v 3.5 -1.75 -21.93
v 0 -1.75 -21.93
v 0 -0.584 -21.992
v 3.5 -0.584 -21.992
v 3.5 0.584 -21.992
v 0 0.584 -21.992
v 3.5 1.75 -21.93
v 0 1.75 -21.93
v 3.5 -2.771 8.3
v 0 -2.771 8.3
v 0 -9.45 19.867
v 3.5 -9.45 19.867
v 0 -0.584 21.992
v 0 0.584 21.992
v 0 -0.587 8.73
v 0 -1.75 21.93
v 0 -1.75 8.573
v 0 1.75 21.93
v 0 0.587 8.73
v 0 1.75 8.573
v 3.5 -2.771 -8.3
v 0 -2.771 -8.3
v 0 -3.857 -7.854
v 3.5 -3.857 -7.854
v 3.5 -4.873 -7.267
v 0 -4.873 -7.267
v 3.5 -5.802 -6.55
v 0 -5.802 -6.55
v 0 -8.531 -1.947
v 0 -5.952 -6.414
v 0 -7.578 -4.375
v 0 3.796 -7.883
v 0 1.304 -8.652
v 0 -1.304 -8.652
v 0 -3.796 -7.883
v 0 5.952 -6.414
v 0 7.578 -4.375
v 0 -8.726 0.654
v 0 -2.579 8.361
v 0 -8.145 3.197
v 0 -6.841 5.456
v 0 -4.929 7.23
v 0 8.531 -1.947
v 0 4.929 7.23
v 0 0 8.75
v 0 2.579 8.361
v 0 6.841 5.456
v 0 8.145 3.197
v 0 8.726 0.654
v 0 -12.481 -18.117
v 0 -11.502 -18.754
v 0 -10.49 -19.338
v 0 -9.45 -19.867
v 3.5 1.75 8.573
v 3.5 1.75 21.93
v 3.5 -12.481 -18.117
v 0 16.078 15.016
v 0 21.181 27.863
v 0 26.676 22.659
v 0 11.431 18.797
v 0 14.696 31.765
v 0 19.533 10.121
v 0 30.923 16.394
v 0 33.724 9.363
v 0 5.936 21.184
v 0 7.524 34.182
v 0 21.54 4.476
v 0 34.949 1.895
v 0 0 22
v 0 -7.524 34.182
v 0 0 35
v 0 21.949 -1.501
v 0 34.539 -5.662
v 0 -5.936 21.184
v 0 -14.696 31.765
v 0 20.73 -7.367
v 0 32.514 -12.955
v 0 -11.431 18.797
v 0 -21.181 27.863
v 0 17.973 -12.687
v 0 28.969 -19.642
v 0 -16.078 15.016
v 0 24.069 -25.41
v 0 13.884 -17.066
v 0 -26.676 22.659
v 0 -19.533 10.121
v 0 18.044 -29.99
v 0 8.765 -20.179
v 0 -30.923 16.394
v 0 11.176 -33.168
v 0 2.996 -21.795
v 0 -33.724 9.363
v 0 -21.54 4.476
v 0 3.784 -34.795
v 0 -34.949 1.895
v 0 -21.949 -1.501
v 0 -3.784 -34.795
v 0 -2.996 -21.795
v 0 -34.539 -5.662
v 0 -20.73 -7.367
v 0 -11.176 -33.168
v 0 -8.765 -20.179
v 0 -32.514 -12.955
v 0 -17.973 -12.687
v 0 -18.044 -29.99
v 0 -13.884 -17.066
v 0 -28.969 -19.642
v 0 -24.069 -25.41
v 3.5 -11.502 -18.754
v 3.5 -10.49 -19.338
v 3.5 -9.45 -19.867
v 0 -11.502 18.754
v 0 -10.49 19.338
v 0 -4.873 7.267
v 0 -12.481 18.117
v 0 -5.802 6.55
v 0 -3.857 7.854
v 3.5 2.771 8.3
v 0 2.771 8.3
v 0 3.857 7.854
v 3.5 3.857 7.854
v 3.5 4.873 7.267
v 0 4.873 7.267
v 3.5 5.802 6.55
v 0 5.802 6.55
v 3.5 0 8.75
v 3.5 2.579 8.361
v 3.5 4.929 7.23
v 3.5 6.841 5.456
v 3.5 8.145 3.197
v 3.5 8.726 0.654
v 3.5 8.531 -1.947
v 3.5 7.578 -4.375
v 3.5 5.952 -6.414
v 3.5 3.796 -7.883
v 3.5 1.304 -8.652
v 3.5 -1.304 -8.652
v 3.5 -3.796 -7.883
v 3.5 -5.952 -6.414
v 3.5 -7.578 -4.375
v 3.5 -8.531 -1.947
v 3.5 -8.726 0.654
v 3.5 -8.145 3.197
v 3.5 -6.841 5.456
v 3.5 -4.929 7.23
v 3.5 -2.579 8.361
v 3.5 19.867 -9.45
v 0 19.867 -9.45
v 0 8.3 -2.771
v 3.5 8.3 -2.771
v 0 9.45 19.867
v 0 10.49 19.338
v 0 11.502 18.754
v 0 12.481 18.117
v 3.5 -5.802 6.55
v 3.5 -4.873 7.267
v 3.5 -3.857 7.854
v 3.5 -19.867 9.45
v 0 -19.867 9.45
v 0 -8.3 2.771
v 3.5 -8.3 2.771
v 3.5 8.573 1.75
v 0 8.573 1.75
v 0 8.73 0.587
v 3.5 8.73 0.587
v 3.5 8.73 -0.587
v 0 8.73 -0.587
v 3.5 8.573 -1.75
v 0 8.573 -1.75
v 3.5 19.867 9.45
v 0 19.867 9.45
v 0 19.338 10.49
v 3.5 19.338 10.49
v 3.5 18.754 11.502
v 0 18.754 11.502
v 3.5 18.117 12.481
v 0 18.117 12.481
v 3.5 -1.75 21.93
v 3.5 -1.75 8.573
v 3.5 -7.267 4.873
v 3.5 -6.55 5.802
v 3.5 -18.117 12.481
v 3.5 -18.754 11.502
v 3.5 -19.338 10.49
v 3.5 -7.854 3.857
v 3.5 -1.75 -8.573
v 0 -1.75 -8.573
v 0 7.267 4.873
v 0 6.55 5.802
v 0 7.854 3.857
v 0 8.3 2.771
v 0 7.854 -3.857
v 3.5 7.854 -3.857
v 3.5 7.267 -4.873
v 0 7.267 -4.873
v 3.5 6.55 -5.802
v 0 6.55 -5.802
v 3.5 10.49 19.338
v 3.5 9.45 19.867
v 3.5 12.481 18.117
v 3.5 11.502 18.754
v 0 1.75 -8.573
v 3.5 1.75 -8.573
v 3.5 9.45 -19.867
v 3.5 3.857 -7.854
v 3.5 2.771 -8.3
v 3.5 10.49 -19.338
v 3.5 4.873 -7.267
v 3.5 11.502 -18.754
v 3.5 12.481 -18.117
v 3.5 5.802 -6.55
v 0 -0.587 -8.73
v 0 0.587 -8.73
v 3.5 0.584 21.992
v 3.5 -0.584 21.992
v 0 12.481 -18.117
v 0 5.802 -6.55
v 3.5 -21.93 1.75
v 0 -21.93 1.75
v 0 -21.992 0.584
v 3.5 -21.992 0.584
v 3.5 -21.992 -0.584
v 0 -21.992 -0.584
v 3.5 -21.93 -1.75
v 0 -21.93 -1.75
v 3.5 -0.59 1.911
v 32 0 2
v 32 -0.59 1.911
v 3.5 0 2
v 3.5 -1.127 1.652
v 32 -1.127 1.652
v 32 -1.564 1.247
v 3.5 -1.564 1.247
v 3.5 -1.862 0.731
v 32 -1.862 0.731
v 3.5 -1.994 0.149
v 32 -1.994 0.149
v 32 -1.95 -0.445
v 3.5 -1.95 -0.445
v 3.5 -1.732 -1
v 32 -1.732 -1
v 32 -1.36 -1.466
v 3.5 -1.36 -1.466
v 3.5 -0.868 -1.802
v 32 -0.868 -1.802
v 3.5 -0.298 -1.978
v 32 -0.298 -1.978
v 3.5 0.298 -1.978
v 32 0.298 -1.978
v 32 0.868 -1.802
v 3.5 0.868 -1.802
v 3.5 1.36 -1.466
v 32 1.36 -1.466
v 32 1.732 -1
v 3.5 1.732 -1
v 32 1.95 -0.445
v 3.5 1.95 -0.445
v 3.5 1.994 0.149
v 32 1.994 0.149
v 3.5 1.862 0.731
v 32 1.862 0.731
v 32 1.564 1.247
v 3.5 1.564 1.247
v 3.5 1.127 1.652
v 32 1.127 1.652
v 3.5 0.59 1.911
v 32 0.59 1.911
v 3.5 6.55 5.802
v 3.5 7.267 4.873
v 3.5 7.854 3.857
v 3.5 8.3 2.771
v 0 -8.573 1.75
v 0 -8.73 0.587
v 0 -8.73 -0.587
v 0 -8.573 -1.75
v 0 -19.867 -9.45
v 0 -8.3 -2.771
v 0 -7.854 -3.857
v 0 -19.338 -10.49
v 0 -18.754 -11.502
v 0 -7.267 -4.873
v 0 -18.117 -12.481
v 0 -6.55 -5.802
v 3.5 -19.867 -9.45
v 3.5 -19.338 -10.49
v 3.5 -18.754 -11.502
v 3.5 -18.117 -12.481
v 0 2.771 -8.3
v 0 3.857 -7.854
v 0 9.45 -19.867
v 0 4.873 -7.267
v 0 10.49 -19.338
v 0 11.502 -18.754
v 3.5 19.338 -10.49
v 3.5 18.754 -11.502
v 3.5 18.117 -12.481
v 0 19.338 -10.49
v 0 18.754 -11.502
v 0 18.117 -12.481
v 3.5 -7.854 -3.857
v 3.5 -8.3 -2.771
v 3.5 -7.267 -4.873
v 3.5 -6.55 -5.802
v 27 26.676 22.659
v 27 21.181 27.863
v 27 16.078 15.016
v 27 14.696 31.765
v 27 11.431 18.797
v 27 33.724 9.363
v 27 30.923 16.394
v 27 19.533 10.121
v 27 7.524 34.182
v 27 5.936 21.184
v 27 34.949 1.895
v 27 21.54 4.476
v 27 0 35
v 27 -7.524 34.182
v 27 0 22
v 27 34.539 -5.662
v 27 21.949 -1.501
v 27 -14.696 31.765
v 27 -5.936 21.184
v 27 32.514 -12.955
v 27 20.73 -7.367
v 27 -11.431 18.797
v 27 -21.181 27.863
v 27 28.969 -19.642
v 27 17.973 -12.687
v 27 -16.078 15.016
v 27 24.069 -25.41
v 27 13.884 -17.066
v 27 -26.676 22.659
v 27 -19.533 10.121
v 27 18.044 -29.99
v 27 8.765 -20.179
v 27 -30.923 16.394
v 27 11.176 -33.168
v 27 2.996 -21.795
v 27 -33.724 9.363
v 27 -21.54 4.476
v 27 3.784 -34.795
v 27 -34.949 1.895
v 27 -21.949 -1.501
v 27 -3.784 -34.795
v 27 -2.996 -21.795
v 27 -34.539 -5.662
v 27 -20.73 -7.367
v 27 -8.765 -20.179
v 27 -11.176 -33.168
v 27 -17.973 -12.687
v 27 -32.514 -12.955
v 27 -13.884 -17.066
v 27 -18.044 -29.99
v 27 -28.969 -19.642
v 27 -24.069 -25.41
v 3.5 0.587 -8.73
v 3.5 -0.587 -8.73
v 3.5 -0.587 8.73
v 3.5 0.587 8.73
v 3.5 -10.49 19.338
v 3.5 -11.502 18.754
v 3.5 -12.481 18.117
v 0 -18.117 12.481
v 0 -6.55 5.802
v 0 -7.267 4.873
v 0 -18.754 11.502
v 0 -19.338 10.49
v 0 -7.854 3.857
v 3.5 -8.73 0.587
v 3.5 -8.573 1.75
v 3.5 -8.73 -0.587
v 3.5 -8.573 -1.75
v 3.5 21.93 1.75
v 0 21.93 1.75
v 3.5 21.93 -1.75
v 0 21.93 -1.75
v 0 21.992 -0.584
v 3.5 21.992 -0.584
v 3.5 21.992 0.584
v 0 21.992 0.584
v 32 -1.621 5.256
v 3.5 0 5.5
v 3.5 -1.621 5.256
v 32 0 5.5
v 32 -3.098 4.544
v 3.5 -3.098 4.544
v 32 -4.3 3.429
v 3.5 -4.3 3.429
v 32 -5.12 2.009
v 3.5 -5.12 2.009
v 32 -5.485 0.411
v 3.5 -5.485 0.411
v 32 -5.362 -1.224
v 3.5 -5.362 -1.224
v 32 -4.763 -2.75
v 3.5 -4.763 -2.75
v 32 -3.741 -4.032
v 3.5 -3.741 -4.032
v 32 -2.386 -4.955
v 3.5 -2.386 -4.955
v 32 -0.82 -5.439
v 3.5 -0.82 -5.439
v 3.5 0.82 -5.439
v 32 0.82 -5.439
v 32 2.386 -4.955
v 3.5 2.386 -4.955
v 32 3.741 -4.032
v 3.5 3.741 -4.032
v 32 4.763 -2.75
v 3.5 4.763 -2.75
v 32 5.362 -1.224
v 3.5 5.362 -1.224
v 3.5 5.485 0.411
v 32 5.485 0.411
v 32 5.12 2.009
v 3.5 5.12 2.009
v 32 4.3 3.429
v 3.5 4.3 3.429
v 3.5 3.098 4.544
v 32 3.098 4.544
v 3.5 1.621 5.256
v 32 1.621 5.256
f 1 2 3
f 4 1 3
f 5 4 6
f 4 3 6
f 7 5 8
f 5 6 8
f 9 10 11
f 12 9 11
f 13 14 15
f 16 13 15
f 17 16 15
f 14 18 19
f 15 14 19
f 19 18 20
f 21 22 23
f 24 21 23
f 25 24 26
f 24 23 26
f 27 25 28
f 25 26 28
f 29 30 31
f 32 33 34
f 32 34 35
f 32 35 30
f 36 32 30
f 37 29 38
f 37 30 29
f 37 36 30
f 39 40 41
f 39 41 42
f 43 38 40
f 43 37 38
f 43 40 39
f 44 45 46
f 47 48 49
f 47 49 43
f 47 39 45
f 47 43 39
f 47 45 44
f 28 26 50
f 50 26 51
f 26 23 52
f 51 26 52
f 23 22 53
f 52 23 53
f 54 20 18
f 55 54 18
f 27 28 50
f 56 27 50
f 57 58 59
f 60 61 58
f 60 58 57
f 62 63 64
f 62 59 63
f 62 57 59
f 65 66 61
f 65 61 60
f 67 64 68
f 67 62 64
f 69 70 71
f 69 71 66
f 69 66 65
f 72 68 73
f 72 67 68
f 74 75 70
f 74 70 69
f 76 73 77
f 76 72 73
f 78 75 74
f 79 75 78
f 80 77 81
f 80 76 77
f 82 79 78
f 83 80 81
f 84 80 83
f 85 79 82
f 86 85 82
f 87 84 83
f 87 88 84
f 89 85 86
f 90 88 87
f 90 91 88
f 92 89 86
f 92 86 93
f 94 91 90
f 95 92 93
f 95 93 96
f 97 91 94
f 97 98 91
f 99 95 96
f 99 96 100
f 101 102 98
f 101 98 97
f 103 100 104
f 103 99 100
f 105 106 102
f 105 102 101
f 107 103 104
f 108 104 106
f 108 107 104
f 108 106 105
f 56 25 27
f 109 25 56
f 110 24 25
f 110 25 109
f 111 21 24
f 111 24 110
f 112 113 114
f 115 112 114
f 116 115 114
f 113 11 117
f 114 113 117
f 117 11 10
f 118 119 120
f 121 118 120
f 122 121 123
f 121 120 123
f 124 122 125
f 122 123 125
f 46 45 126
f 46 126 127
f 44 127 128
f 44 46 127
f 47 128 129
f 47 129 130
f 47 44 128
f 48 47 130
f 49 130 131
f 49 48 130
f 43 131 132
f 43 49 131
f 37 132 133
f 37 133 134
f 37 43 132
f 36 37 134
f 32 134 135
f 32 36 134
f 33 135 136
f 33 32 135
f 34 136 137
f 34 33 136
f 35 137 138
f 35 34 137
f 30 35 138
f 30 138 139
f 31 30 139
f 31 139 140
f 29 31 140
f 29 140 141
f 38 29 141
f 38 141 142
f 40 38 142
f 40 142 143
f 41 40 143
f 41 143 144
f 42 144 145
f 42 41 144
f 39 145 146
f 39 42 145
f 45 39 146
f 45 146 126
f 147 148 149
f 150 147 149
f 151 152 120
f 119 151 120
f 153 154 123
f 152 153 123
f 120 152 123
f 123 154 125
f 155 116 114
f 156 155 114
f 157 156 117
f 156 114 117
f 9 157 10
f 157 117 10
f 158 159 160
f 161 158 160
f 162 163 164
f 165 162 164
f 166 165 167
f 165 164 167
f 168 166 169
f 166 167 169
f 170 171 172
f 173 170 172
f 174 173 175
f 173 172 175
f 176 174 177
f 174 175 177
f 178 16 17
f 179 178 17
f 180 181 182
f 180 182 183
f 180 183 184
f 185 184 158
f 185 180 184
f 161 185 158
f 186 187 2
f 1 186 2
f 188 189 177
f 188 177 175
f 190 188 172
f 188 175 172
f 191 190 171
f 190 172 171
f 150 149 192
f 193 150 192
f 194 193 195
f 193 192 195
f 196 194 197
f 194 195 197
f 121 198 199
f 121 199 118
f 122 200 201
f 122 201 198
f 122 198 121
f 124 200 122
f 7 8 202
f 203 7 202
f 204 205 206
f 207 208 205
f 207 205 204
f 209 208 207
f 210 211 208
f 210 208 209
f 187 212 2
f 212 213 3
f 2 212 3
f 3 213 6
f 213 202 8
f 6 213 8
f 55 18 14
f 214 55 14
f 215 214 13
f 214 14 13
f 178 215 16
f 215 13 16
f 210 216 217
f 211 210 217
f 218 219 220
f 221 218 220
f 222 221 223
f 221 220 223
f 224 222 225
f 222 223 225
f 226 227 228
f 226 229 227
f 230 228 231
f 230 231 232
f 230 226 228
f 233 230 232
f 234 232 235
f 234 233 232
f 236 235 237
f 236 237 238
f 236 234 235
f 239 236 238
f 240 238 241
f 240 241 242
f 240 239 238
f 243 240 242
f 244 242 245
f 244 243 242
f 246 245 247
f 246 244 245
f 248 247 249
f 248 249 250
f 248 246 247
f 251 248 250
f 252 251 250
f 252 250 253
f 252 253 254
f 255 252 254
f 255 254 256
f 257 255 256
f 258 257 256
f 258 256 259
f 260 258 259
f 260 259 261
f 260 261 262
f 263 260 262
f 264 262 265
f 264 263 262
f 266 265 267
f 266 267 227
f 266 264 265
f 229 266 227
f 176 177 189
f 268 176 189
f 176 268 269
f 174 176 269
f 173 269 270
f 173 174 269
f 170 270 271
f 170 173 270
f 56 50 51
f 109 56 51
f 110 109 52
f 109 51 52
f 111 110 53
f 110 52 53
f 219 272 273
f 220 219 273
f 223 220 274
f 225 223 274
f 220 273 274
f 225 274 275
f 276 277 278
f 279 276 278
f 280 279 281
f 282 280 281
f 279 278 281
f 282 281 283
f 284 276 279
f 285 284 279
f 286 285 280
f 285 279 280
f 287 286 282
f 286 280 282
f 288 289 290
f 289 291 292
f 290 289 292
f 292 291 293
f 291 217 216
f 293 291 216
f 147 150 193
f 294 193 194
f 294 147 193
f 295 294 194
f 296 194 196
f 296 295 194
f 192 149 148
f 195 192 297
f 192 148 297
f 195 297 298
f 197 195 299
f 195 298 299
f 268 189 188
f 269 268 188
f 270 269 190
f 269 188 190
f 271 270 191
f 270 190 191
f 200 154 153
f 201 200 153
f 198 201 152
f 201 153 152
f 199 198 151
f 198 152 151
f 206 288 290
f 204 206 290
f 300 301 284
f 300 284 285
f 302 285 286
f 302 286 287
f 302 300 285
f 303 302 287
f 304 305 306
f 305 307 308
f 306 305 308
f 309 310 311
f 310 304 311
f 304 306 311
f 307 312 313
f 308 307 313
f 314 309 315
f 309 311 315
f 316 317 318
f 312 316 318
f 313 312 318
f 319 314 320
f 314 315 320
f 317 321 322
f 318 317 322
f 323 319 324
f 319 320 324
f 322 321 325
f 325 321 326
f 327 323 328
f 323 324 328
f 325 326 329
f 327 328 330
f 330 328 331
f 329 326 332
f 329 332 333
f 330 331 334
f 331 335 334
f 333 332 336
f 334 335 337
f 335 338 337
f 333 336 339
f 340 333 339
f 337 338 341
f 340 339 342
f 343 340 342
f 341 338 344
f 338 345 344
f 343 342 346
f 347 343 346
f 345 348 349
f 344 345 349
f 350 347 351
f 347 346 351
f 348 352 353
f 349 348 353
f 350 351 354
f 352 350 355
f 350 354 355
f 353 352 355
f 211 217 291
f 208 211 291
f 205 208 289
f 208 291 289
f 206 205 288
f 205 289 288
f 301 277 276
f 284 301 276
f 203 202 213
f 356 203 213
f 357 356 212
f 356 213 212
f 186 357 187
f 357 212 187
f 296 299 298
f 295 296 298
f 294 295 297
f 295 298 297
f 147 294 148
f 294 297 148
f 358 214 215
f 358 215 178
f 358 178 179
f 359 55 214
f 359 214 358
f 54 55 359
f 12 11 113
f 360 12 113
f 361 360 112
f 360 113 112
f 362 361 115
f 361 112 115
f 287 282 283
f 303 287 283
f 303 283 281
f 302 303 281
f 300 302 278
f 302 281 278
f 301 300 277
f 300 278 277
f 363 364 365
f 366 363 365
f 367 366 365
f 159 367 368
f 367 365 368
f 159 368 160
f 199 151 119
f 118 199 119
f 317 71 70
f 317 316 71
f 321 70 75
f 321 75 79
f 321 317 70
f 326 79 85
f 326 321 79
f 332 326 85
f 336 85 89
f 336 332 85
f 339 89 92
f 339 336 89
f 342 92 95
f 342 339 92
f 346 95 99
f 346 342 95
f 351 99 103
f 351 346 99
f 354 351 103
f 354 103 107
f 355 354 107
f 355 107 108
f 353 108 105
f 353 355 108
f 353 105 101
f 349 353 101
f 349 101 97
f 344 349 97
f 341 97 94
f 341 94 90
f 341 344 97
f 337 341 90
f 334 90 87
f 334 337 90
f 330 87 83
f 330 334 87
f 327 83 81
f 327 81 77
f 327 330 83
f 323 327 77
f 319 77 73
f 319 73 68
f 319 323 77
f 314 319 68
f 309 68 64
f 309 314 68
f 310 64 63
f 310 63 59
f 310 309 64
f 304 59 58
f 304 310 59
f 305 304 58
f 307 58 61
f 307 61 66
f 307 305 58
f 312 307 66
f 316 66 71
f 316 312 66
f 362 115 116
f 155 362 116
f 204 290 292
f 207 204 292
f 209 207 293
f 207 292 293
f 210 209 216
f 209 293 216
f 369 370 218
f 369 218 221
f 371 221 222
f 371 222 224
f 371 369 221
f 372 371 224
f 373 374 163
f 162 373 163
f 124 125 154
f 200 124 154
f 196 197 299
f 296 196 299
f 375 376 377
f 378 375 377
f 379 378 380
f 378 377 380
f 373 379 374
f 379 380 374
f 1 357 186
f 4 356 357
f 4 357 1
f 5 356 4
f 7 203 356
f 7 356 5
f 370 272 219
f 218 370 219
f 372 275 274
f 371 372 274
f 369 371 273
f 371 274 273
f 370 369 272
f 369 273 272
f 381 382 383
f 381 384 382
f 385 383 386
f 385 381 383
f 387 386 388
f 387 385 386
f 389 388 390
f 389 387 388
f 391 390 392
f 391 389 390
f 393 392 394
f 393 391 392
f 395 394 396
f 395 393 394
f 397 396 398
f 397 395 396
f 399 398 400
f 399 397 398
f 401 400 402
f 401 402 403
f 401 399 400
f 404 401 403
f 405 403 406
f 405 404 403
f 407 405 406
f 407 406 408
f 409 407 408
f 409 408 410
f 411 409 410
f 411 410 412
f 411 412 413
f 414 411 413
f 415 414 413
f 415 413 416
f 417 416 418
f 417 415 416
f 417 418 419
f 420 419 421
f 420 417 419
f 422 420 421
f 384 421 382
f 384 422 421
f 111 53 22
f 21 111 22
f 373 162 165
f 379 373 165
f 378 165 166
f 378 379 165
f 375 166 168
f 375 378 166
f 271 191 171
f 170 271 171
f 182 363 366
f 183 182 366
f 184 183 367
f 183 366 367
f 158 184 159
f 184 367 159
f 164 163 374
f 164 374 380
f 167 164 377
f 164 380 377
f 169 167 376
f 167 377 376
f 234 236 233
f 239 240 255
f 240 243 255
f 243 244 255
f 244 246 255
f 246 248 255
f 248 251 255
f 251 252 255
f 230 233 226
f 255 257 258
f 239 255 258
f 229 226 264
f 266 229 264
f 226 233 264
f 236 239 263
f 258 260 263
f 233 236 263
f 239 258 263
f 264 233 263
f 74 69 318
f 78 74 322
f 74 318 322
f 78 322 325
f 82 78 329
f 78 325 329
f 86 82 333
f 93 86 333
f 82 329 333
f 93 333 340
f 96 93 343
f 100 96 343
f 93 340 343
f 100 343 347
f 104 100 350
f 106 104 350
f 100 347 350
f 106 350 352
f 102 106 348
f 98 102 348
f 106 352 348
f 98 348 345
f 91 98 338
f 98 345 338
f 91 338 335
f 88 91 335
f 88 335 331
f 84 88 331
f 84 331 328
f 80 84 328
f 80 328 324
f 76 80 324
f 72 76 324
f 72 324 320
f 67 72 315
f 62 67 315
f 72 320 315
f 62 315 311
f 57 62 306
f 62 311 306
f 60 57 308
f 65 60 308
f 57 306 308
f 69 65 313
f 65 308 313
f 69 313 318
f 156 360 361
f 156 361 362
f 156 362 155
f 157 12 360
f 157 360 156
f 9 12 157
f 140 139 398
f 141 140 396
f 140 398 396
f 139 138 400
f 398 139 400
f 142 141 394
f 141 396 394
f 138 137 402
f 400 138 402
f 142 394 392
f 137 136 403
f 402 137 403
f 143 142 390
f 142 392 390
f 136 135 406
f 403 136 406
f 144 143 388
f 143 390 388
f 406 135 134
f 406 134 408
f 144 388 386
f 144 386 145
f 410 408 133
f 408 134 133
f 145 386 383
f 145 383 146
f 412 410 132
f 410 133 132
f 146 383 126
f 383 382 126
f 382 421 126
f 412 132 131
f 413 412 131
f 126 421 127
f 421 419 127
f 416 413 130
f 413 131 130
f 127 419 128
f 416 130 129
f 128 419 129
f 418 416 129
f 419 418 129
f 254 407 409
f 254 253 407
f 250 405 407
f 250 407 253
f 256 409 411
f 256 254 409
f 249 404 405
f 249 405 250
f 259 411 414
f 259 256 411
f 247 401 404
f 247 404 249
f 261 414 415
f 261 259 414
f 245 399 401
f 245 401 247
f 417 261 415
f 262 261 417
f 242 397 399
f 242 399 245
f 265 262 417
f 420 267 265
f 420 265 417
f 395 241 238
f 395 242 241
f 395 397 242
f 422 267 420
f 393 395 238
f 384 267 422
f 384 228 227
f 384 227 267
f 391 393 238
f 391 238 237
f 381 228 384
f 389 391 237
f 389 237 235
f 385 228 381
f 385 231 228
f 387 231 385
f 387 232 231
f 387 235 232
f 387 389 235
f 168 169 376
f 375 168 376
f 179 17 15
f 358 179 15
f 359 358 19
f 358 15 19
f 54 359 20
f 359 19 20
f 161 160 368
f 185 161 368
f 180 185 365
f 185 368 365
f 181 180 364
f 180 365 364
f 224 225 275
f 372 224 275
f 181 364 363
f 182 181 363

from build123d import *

# Parameters (mm, degrees)
SKETCH1_W              = 27
SKETCH1_H              = 13
SKETCH1_H_2            = 3.5
SKETCH3_R              = 5.5
SKETCH3_R_2            = 2
BOSS_EXTRUDE1_DEPTH    = 5
SKETCH4_R              = 8.75
BOSS_EXTRUDE2_DEPTH    = 3.5
BOSS_EXTRUDE3_DEPTH    = 3.5
BOSS_EXTRUDE3_2_DEPTH  = 3.5
BOSS_EXTRUDE3_3_DEPTH  = 3.5
BOSS_EXTRUDE3_4_DEPTH  = 3.5
BOSS_EXTRUDE3_5_DEPTH  = 3.5
BOSS_EXTRUDE3_6_DEPTH  = 3.5
BOSS_EXTRUDE3_7_DEPTH  = 3.5
BOSS_EXTRUDE3_8_DEPTH  = 3.5
BOSS_EXTRUDE3_9_DEPTH  = 3.5
BOSS_EXTRUDE3_10_DEPTH = 3.5
BOSS_EXTRUDE3_11_DEPTH = 3.5
BOSS_EXTRUDE3_12_DEPTH = 3.5


with BuildPart() as part:
    # Sketch1 → Revolve2 (revolve)
    with BuildSketch(Plane.XY, mode=Mode.PRIVATE) as revolve2_sk:
        with Locations((13.5, 28.5)):
            Rectangle(SKETCH1_W, SKETCH1_H)
        with Locations((13.5, 3.75)):
            Rectangle(SKETCH1_W, SKETCH1_H_2)
    revolve(revolve2_sk.sketch.rotate(Axis((0, 0, 0), (1, 0, 0)), 90), axis=Axis((0, 0, 0), (1, 0, 0)))

    # Sketch3 → Boss-Extrude1 (add)
    with BuildSketch(Plane(origin=(27, 0, 0), x_dir=(0, 0, -1), z_dir=(1, 0, 0))):
        with Locations(Location((0, 0, 0), (0, 0, 180))):
            Circle(SKETCH3_R)
        with Locations(Location((0, 0, 0), (0, 0, 180))):
            Circle(SKETCH3_R_2, mode=Mode.SUBTRACT)
    extrude(amount=BOSS_EXTRUDE1_DEPTH)

    # Sketch4 → Boss-Extrude2 (add)
    with BuildSketch(Plane.ZY):
        Circle(SKETCH4_R)
    extrude(amount=-BOSS_EXTRUDE2_DEPTH)


with BuildPart() as body_2:
    # Sketch5 → Boss-Extrude3 (new body)
    with BuildSketch(Plane.ZY):
        with BuildLine():
            Line((-1.75, 8.5732141), (-1.75, 21.930287276))
            ThreePointArc((-1.75, 21.930287276), (0, 22), (1.75, 21.930287276))
            Line((1.75, 21.930287276), (1.75, 8.5732141))
            ThreePointArc((1.75, 8.5732141), (0, 8.75), (-1.75, 8.5732141))
        make_face()
    extrude(amount=-BOSS_EXTRUDE3_DEPTH)


with BuildPart() as body_3:
    # Sketch5 → Boss-Extrude3 2 (new body)
    with BuildSketch(Plane.ZY):
        with BuildLine():
            Line((2.771062593, 8.299621202), (9.449599181, 19.867185893))
            ThreePointArc((9.449599181, 19.867185893), (11, 19.052558883), (12.480688095, 18.117185893))
            Line((12.480688095, 18.117185893), (5.802151506, 6.549621202))
            ThreePointArc((5.802151506, 6.549621202), (4.375, 7.577722283), (2.771062593, 8.299621202))
        make_face()
    extrude(amount=-BOSS_EXTRUDE3_2_DEPTH)


with BuildPart() as body_4:
    # Sketch5 → Boss-Extrude3 3 (new body)
    with BuildSketch(Plane.ZY):
        with BuildLine():
            Line((6.549621202, 5.802151506), (18.117185893, 12.480688095))
            ThreePointArc((18.117185893, 12.480688095), (19.052558883, 11), (19.867185893, 9.449599181))
            Line((19.867185893, 9.449599181), (8.299621202, 2.771062593))
            ThreePointArc((8.299621202, 2.771062593), (7.577722283, 4.375), (6.549621202, 5.802151506))
        make_face()
    extrude(amount=-BOSS_EXTRUDE3_3_DEPTH)


with BuildPart() as body_5:
    # Sketch5 → Boss-Extrude3 4 (new body)
    with BuildSketch(Plane.ZY):
        with BuildLine():
            Line((8.5732141, 1.75), (21.930287276, 1.75))
            ThreePointArc((21.930287276, 1.75), (22, 0), (21.930287276, -1.75))
            Line((21.930287276, -1.75), (8.5732141, -1.75))
            ThreePointArc((8.5732141, -1.75), (8.75, 0), (8.5732141, 1.75))
        make_face()
    extrude(amount=-BOSS_EXTRUDE3_4_DEPTH)


with BuildPart() as body_6:
    # Sketch5 → Boss-Extrude3 5 (new body)
    with BuildSketch(Plane.ZY):
        with BuildLine():
            Line((8.299621202, -2.771062593), (19.867185893, -9.449599181))
            ThreePointArc((19.867185893, -9.449599181), (19.052558883, -11), (18.117185893, -12.480688095))
            Line((18.117185893, -12.480688095), (6.549621202, -5.802151506))
            ThreePointArc((6.549621202, -5.802151506), (7.577722283, -4.375), (8.299621202, -2.771062593))
        make_face()
    extrude(amount=-BOSS_EXTRUDE3_5_DEPTH)


with BuildPart() as body_7:
    # Sketch5 → Boss-Extrude3 6 (new body)
    with BuildSketch(Plane.ZY):
        with BuildLine():
            Line((5.802151506, -6.549621202), (12.480688095, -18.117185893))
            ThreePointArc((12.480688095, -18.117185893), (11, -19.052558883), (9.449599181, -19.867185893))
            Line((9.449599181, -19.867185893), (2.771062593, -8.299621202))
            ThreePointArc((2.771062593, -8.299621202), (4.375, -7.577722283), (5.802151506, -6.549621202))
        make_face()
    extrude(amount=-BOSS_EXTRUDE3_6_DEPTH)


with BuildPart() as body_8:
    # Sketch5 → Boss-Extrude3 7 (new body)
    with BuildSketch(Plane.ZY):
        with BuildLine():
            Line((1.75, -8.5732141), (1.75, -21.930287276))
            ThreePointArc((1.75, -21.930287276), (0, -22), (-1.75, -21.930287276))
            Line((-1.75, -21.930287276), (-1.75, -8.5732141))
            ThreePointArc((-1.75, -8.5732141), (0, -8.75), (1.75, -8.5732141))
        make_face()
    extrude(amount=-BOSS_EXTRUDE3_7_DEPTH)


with BuildPart() as body_9:
    # Sketch5 → Boss-Extrude3 8 (new body)
    with BuildSketch(Plane.ZY):
        with BuildLine():
            Line((-2.771062593, -8.299621202), (-9.449599181, -19.867185893))
            ThreePointArc((-9.449599181, -19.867185893), (-11, -19.052558883), (-12.480688095, -18.117185893))
            Line((-12.480688095, -18.117185893), (-5.802151506, -6.549621202))
            ThreePointArc((-5.802151506, -6.549621202), (-4.375, -7.577722283), (-2.771062593, -8.299621202))
        make_face()
    extrude(amount=-BOSS_EXTRUDE3_8_DEPTH)


with BuildPart() as body_10:
    # Sketch5 → Boss-Extrude3 9 (new body)
    with BuildSketch(Plane.ZY):
        with BuildLine():
            Line((-6.549621202, -5.802151506), (-18.117185893, -12.480688095))
            ThreePointArc((-18.117185893, -12.480688095), (-19.052558883, -11), (-19.867185893, -9.449599181))
            Line((-19.867185893, -9.449599181), (-8.299621202, -2.771062593))
            ThreePointArc((-8.299621202, -2.771062593), (-7.577722283, -4.375), (-6.549621202, -5.802151506))
        make_face()
    extrude(amount=-BOSS_EXTRUDE3_9_DEPTH)


with BuildPart() as body_11:
    # Sketch5 → Boss-Extrude3 10 (new body)
    with BuildSketch(Plane.ZY):
        with BuildLine():
            Line((-8.5732141, -1.75), (-21.930287276, -1.75))
            ThreePointArc((-21.930287276, -1.75), (-22, 0), (-21.930287276, 1.75))
            Line((-21.930287276, 1.75), (-8.5732141, 1.75))
            ThreePointArc((-8.5732141, 1.75), (-8.75, 0), (-8.5732141, -1.75))
        make_face()
    extrude(amount=-BOSS_EXTRUDE3_10_DEPTH)


with BuildPart() as body_12:
    # Sketch5 → Boss-Extrude3 11 (new body)
    with BuildSketch(Plane.ZY):
        with BuildLine():
            Line((-8.299621202, 2.771062593), (-19.867185893, 9.449599181))
            ThreePointArc((-19.867185893, 9.449599181), (-19.052558883, 11), (-18.117185893, 12.480688095))
            Line((-18.117185893, 12.480688095), (-6.549621202, 5.802151506))
            ThreePointArc((-6.549621202, 5.802151506), (-7.577722283, 4.375), (-8.299621202, 2.771062593))
        make_face()
    extrude(amount=-BOSS_EXTRUDE3_11_DEPTH)


with BuildPart() as body_13:
    # Sketch5 → Boss-Extrude3 12 (new body)
    with BuildSketch(Plane.ZY):
        with BuildLine():
            Line((-5.802151506, 6.549621202), (-12.480688095, 18.117185893))
            ThreePointArc((-12.480688095, 18.117185893), (-11, 19.052558883), (-9.449599181, 19.867185893))
            Line((-9.449599181, 19.867185893), (-2.771062593, 8.299621202))
            ThreePointArc((-2.771062593, 8.299621202), (-4.375, 7.577722283), (-5.802151506, 6.549621202))
        make_face()
    extrude(amount=-BOSS_EXTRUDE3_12_DEPTH)


solid = Compound([part.part, body_2.part, body_3.part, body_4.part, body_5.part, body_6.part, body_7.part, body_8.part, body_9.part, body_10.part, body_11.part, body_12.part, body_13.part])
